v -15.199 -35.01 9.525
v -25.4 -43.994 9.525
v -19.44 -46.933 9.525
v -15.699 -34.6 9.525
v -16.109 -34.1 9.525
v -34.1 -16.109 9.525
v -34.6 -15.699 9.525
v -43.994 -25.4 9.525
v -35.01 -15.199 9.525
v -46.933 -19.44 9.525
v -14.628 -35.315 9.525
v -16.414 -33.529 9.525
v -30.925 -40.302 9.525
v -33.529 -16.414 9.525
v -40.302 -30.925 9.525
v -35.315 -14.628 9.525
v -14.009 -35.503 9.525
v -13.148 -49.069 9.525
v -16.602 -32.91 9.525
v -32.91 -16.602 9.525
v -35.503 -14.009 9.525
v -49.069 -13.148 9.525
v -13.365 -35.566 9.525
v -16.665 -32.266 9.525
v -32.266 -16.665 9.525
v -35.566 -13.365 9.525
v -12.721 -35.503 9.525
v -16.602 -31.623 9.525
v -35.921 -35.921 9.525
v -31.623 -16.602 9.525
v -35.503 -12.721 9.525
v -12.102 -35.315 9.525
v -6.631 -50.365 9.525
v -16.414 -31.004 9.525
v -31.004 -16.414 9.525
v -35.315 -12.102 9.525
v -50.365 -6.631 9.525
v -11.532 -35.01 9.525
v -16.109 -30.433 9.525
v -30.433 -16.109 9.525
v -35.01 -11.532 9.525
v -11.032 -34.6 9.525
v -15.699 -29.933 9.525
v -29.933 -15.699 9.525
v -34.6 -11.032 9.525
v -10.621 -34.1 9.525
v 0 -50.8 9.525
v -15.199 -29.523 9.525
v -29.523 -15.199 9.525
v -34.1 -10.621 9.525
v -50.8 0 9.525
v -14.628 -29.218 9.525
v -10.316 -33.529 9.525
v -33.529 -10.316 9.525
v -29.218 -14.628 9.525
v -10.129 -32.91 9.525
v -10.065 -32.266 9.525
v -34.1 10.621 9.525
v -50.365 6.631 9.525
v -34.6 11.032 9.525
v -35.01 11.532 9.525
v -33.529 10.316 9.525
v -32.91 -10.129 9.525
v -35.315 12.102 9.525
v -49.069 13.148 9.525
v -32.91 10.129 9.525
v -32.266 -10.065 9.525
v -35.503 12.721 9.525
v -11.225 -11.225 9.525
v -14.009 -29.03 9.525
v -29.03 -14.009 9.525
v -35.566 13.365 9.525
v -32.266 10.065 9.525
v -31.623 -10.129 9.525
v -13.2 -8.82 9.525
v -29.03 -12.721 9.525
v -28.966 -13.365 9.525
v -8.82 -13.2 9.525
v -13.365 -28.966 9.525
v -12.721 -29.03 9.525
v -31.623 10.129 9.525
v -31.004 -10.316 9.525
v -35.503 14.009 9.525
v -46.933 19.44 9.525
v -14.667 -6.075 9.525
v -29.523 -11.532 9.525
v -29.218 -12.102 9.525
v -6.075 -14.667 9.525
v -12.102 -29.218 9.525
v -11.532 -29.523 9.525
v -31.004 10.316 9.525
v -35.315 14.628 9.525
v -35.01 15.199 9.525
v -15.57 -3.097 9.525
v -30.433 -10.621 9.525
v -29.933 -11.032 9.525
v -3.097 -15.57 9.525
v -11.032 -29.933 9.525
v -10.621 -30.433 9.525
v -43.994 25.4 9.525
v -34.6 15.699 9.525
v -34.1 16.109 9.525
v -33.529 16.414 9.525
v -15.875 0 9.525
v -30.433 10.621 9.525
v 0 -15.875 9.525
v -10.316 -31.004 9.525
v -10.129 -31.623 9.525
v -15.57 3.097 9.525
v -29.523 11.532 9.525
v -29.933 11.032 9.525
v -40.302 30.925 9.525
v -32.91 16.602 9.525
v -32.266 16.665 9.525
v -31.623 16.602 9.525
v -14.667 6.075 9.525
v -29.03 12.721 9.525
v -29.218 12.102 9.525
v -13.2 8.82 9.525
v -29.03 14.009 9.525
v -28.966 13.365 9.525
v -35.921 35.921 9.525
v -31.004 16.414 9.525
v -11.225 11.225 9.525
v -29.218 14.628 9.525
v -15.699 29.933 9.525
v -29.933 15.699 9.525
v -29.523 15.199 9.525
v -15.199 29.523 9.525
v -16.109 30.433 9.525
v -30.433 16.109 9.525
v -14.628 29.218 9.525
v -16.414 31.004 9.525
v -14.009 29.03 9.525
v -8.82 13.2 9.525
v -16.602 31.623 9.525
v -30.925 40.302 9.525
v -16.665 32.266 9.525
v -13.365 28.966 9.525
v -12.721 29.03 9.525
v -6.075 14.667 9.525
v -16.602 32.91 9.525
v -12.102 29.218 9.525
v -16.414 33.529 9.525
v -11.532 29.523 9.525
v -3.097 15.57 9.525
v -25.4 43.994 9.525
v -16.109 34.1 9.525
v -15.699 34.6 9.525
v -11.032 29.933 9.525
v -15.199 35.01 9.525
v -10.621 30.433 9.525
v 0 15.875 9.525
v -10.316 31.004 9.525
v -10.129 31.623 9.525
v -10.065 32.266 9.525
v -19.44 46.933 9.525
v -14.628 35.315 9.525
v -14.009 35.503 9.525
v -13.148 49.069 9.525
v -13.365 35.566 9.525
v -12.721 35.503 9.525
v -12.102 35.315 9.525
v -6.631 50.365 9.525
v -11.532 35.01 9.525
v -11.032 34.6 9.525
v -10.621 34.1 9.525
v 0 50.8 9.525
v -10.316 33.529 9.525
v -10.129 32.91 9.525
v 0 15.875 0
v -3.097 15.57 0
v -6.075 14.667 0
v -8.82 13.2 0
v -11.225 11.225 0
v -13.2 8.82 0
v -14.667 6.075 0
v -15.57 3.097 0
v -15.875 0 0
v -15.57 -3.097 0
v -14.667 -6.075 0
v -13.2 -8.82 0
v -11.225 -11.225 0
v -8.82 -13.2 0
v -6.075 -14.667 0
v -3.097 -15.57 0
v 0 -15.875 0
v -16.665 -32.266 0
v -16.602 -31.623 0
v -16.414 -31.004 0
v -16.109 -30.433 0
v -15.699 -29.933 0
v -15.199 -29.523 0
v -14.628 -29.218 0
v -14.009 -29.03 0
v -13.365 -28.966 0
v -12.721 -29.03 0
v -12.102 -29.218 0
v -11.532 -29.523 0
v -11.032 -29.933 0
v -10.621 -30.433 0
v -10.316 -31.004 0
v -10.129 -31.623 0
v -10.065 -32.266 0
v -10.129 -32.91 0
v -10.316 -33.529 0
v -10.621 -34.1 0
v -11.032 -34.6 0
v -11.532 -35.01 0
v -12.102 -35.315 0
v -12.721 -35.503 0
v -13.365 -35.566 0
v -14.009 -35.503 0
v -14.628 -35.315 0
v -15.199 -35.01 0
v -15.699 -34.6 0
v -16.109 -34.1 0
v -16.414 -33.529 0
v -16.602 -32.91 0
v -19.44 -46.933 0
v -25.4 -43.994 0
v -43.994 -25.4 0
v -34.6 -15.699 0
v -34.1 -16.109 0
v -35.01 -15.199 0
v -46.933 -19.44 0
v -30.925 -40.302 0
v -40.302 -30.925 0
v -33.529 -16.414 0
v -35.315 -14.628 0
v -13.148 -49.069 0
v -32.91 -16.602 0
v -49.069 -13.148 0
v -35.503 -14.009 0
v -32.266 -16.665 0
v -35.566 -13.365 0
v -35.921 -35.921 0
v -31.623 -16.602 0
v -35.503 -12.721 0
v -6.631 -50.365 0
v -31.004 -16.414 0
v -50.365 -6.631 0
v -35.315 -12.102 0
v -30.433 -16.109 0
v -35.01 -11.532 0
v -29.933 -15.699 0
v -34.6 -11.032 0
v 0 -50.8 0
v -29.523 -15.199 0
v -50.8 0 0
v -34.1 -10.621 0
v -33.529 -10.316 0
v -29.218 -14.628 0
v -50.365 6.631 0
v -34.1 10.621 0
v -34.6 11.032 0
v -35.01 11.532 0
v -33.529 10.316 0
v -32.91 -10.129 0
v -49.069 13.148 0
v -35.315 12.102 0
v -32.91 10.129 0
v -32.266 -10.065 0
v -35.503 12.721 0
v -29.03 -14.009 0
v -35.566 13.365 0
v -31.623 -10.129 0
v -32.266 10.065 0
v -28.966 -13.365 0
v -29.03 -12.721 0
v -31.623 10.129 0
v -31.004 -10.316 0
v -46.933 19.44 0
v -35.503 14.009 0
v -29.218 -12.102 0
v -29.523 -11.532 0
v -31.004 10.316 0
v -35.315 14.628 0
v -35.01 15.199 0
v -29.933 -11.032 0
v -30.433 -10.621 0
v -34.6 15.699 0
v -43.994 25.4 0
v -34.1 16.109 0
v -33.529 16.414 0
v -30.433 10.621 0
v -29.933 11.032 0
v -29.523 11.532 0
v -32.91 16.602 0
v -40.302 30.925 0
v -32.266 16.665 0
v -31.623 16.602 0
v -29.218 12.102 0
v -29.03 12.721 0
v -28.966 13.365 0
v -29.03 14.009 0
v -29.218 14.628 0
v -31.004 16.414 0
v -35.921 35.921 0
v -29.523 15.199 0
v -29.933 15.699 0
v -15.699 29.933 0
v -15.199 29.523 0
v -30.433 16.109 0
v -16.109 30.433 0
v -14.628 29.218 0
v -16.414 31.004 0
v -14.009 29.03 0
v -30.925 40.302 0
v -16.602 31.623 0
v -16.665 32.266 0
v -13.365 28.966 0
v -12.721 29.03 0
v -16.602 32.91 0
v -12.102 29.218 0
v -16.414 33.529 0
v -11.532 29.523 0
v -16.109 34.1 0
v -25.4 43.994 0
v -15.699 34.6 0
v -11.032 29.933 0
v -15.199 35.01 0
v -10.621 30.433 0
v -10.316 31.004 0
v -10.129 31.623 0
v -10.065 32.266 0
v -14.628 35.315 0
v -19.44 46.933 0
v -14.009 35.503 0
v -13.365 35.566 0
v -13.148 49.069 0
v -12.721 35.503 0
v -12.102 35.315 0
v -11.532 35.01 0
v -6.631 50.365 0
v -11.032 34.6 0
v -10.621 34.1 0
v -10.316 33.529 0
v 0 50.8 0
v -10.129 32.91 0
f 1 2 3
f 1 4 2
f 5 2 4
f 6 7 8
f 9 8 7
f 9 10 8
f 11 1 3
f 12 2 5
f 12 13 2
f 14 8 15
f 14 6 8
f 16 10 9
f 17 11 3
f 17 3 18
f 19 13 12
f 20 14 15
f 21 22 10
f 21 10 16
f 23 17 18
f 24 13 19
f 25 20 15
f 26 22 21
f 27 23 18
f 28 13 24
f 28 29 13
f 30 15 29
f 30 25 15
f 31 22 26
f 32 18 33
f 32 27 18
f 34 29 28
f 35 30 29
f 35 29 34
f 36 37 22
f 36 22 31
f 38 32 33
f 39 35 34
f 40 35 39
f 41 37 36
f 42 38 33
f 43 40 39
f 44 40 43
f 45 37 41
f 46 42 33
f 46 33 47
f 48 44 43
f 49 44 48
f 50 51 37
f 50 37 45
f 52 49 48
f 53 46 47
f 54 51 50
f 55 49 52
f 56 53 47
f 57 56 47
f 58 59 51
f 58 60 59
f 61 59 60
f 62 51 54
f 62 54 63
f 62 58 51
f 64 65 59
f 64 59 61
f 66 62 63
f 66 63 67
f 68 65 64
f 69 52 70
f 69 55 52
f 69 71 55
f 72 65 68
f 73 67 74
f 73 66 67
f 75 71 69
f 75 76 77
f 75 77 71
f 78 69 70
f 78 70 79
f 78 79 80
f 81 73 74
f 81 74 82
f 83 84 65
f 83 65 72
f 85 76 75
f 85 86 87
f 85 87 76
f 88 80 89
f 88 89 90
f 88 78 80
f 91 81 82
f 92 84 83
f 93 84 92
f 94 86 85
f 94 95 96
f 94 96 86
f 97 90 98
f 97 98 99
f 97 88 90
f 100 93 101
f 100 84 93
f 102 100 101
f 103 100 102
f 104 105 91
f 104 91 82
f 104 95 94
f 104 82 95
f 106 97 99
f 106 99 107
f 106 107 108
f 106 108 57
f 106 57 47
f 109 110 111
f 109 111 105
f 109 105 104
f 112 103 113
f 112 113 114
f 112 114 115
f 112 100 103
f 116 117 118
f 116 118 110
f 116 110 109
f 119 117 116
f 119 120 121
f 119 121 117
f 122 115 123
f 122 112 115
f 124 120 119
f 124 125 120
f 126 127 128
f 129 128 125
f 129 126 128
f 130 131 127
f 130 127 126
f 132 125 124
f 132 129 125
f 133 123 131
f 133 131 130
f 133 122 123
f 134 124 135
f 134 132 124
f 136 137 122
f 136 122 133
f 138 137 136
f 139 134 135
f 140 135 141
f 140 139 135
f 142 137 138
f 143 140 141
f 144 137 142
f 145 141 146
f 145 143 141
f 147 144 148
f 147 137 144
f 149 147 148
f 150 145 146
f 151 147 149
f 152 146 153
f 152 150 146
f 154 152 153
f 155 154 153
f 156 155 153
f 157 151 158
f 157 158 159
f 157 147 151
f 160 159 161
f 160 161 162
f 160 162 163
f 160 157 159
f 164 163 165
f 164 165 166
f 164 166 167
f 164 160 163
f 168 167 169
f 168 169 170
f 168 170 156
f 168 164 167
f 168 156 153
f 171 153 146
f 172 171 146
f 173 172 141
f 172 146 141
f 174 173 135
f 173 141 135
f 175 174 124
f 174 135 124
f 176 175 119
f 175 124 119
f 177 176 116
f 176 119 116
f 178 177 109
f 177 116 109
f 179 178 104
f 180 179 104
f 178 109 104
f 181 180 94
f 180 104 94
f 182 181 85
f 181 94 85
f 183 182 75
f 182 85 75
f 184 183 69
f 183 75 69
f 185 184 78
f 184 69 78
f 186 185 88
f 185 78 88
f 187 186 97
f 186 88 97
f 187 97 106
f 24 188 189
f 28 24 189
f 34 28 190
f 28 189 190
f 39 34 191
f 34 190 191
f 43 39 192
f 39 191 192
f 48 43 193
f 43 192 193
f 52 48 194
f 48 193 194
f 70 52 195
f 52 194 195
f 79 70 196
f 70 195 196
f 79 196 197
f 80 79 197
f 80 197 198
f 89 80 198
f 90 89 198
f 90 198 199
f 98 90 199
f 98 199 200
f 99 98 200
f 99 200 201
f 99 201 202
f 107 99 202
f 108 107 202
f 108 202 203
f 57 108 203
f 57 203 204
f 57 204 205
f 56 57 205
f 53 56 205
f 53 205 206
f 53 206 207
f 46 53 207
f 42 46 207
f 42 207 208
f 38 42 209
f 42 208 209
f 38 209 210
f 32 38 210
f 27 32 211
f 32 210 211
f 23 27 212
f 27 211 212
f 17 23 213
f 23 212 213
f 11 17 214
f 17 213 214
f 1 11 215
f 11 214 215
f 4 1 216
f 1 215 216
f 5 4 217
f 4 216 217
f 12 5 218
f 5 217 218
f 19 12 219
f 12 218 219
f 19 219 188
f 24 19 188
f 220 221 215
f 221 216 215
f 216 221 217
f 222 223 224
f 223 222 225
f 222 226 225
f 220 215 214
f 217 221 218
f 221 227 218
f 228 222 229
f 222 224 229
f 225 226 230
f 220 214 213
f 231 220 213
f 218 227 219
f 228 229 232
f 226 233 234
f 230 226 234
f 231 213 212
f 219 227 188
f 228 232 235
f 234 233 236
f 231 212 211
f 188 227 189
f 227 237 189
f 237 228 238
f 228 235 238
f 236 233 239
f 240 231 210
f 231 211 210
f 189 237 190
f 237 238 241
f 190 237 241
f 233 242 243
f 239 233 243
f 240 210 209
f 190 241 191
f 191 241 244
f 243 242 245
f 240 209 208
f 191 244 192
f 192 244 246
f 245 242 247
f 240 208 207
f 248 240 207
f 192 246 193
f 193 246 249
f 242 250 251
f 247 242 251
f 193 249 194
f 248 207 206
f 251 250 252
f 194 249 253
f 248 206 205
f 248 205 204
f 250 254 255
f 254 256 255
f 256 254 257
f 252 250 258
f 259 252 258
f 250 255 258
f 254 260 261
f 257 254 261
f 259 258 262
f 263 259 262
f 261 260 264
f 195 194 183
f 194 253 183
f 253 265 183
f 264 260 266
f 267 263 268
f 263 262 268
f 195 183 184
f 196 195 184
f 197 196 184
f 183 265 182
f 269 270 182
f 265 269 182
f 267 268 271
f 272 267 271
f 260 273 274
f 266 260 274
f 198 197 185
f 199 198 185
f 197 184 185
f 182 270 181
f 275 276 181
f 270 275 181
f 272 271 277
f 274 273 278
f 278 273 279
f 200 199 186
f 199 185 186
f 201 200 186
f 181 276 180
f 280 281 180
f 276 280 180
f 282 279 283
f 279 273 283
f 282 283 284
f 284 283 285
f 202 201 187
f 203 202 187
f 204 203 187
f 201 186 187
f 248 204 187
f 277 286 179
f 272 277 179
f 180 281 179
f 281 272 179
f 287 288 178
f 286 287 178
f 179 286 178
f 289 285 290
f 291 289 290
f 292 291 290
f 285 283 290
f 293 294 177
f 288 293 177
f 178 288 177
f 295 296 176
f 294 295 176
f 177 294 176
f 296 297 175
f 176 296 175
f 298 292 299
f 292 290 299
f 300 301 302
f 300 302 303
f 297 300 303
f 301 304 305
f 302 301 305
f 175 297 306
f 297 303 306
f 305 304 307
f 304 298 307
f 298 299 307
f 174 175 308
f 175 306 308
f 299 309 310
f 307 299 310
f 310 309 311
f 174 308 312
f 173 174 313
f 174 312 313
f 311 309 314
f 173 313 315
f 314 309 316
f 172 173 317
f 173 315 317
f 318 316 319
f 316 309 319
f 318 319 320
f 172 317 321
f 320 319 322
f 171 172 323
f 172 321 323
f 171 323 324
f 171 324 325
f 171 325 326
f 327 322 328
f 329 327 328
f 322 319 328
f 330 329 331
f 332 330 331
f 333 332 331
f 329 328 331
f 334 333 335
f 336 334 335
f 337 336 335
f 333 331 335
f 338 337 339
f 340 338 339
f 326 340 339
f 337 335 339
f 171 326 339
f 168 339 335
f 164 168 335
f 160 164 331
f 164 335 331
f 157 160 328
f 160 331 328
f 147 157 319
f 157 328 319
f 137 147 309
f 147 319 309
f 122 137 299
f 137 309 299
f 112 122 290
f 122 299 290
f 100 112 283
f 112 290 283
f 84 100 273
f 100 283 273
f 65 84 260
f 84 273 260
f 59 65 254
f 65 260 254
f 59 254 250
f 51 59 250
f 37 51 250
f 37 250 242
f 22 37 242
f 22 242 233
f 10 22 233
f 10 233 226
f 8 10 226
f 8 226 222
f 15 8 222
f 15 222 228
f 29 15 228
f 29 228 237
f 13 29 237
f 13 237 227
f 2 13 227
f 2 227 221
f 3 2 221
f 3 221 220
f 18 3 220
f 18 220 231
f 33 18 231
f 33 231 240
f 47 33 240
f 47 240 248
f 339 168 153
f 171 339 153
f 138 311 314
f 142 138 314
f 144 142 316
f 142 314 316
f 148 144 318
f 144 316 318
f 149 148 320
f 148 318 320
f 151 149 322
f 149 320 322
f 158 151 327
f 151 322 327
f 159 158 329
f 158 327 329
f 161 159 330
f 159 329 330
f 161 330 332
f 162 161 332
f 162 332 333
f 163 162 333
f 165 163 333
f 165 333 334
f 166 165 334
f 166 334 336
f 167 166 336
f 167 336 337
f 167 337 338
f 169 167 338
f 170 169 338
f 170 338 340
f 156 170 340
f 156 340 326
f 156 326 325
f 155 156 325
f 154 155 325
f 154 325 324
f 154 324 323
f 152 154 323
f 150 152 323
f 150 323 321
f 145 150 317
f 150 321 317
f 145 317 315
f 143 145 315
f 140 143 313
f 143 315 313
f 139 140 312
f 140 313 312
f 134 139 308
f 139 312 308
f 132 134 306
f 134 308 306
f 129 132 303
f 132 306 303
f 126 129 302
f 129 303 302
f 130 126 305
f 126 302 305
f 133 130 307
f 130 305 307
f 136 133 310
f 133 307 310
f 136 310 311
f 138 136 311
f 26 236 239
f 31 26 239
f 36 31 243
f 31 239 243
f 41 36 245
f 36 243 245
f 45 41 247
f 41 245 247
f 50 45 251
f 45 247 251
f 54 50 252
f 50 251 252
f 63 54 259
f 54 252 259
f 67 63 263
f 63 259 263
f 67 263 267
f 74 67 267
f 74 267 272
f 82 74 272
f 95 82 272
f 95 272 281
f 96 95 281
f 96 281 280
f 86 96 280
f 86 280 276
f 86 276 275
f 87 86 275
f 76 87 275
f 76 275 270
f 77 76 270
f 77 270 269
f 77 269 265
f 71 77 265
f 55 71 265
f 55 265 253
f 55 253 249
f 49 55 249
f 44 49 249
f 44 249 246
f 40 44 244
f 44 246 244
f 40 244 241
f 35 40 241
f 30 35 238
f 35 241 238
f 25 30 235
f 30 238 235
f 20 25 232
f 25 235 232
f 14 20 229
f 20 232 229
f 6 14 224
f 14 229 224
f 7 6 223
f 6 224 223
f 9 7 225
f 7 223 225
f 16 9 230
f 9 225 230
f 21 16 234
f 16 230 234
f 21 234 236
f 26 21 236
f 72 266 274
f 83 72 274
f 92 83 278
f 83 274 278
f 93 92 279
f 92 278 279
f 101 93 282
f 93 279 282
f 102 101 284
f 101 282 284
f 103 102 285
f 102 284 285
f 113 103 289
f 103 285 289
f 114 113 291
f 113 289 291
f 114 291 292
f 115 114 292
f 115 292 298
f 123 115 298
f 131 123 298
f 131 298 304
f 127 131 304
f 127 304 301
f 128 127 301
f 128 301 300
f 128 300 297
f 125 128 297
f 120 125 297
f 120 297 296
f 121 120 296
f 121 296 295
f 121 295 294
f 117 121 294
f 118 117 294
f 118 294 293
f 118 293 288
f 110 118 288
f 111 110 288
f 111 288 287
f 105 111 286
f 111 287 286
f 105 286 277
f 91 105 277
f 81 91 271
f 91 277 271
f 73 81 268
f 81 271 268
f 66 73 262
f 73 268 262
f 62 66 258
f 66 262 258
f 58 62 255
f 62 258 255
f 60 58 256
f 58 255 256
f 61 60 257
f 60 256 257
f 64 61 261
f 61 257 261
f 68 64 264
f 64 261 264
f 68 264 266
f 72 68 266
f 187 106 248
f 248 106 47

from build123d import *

# Parameters (mm, degrees)
F0_R     = 50.8
F1_DEPTH = 9.525
F2_R     = 15.875
F3_DEPTH = 9.526
F5_D     = 6.6
F6_R     = 3.3
F7_DEPTH = 9.526


with BuildPart() as f1:
    # F0 (on Top) → F1 (new body)
    with BuildSketch(Plane.XY):
        Circle(F0_R)
    extrude(amount=F1_DEPTH)

    # F2 (on face) → F3 (cut, through all)
    with BuildSketch(Plane.XY.offset(9.525)):
        Circle(F2_R)
    extrude(amount=-F3_DEPTH, mode=Mode.SUBTRACT)

    # F5 (through all)
    with Locations(Plane.XY.offset(9.525)):
        with Locations((-13.3652133, 32.2664949823), (-32.2664903636, 13.3652244507), (-32.2664949823, -13.3652133), (-13.3652244507, -32.2664903636), (13.3652133, -32.2664949823), (32.2664903636, -13.3652244507), (32.2664949823, 13.3652133), (13.3652244507, 32.2664903636)):
            Hole(F5_D / 2)

    # F6 (on face) → F7 (cut, through all)
    with BuildSketch(Plane.XY.offset(9.525)):
        with BuildLine():
            Line((92.0014753938, 88.4870588779), (0, 88.4870588779))
            Line((0, 88.4870588779), (0, 50.8))
            ThreePointArc((0, 50.8), (35.9210244843, 35.9210244843), (50.8, 0))
            ThreePointArc((50.8, 0), (35.9210244843, -35.9210244843), (0, -50.8))
            Line((0, -50.8), (0, -93.3939293027))
            Line((0, -93.3939293027), (92.0014753938, -93.3939293027))
            Line((92.0014753938, -93.3939293027), (92.0014753938, 88.4870588779))
        make_face()
        with BuildLine():
            ThreePointArc((50.8, 0), (35.9210244843, 35.9210244843), (0, 50.8))
            Line((0, 50.8), (0, 15.875))
            ThreePointArc((0, 15.875), (11.2253201513, 11.2253201513), (15.875, 0))
            ThreePointArc((15.875, 0), (11.2253201513, -11.2253201513), (0, -15.875))
            Line((0, -15.875), (0, -50.8))
            ThreePointArc((0, -50.8), (35.9210244843, -35.9210244843), (50.8, 0))
        make_face()
        with Locations((13.3652133, -32.2664949823)):
            Circle(F6_R, mode=Mode.SUBTRACT)
        with Locations((32.2664903636, -13.3652244507)):
            Circle(F6_R, mode=Mode.SUBTRACT)
        with Locations((13.3652244507, 32.2664903636)):
            Circle(F6_R, mode=Mode.SUBTRACT)
        with Locations((32.2664949823, 13.3652133)):
            Circle(F6_R, mode=Mode.SUBTRACT)
    extrude(amount=-F7_DEPTH, mode=Mode.SUBTRACT)


solid = f1.part
